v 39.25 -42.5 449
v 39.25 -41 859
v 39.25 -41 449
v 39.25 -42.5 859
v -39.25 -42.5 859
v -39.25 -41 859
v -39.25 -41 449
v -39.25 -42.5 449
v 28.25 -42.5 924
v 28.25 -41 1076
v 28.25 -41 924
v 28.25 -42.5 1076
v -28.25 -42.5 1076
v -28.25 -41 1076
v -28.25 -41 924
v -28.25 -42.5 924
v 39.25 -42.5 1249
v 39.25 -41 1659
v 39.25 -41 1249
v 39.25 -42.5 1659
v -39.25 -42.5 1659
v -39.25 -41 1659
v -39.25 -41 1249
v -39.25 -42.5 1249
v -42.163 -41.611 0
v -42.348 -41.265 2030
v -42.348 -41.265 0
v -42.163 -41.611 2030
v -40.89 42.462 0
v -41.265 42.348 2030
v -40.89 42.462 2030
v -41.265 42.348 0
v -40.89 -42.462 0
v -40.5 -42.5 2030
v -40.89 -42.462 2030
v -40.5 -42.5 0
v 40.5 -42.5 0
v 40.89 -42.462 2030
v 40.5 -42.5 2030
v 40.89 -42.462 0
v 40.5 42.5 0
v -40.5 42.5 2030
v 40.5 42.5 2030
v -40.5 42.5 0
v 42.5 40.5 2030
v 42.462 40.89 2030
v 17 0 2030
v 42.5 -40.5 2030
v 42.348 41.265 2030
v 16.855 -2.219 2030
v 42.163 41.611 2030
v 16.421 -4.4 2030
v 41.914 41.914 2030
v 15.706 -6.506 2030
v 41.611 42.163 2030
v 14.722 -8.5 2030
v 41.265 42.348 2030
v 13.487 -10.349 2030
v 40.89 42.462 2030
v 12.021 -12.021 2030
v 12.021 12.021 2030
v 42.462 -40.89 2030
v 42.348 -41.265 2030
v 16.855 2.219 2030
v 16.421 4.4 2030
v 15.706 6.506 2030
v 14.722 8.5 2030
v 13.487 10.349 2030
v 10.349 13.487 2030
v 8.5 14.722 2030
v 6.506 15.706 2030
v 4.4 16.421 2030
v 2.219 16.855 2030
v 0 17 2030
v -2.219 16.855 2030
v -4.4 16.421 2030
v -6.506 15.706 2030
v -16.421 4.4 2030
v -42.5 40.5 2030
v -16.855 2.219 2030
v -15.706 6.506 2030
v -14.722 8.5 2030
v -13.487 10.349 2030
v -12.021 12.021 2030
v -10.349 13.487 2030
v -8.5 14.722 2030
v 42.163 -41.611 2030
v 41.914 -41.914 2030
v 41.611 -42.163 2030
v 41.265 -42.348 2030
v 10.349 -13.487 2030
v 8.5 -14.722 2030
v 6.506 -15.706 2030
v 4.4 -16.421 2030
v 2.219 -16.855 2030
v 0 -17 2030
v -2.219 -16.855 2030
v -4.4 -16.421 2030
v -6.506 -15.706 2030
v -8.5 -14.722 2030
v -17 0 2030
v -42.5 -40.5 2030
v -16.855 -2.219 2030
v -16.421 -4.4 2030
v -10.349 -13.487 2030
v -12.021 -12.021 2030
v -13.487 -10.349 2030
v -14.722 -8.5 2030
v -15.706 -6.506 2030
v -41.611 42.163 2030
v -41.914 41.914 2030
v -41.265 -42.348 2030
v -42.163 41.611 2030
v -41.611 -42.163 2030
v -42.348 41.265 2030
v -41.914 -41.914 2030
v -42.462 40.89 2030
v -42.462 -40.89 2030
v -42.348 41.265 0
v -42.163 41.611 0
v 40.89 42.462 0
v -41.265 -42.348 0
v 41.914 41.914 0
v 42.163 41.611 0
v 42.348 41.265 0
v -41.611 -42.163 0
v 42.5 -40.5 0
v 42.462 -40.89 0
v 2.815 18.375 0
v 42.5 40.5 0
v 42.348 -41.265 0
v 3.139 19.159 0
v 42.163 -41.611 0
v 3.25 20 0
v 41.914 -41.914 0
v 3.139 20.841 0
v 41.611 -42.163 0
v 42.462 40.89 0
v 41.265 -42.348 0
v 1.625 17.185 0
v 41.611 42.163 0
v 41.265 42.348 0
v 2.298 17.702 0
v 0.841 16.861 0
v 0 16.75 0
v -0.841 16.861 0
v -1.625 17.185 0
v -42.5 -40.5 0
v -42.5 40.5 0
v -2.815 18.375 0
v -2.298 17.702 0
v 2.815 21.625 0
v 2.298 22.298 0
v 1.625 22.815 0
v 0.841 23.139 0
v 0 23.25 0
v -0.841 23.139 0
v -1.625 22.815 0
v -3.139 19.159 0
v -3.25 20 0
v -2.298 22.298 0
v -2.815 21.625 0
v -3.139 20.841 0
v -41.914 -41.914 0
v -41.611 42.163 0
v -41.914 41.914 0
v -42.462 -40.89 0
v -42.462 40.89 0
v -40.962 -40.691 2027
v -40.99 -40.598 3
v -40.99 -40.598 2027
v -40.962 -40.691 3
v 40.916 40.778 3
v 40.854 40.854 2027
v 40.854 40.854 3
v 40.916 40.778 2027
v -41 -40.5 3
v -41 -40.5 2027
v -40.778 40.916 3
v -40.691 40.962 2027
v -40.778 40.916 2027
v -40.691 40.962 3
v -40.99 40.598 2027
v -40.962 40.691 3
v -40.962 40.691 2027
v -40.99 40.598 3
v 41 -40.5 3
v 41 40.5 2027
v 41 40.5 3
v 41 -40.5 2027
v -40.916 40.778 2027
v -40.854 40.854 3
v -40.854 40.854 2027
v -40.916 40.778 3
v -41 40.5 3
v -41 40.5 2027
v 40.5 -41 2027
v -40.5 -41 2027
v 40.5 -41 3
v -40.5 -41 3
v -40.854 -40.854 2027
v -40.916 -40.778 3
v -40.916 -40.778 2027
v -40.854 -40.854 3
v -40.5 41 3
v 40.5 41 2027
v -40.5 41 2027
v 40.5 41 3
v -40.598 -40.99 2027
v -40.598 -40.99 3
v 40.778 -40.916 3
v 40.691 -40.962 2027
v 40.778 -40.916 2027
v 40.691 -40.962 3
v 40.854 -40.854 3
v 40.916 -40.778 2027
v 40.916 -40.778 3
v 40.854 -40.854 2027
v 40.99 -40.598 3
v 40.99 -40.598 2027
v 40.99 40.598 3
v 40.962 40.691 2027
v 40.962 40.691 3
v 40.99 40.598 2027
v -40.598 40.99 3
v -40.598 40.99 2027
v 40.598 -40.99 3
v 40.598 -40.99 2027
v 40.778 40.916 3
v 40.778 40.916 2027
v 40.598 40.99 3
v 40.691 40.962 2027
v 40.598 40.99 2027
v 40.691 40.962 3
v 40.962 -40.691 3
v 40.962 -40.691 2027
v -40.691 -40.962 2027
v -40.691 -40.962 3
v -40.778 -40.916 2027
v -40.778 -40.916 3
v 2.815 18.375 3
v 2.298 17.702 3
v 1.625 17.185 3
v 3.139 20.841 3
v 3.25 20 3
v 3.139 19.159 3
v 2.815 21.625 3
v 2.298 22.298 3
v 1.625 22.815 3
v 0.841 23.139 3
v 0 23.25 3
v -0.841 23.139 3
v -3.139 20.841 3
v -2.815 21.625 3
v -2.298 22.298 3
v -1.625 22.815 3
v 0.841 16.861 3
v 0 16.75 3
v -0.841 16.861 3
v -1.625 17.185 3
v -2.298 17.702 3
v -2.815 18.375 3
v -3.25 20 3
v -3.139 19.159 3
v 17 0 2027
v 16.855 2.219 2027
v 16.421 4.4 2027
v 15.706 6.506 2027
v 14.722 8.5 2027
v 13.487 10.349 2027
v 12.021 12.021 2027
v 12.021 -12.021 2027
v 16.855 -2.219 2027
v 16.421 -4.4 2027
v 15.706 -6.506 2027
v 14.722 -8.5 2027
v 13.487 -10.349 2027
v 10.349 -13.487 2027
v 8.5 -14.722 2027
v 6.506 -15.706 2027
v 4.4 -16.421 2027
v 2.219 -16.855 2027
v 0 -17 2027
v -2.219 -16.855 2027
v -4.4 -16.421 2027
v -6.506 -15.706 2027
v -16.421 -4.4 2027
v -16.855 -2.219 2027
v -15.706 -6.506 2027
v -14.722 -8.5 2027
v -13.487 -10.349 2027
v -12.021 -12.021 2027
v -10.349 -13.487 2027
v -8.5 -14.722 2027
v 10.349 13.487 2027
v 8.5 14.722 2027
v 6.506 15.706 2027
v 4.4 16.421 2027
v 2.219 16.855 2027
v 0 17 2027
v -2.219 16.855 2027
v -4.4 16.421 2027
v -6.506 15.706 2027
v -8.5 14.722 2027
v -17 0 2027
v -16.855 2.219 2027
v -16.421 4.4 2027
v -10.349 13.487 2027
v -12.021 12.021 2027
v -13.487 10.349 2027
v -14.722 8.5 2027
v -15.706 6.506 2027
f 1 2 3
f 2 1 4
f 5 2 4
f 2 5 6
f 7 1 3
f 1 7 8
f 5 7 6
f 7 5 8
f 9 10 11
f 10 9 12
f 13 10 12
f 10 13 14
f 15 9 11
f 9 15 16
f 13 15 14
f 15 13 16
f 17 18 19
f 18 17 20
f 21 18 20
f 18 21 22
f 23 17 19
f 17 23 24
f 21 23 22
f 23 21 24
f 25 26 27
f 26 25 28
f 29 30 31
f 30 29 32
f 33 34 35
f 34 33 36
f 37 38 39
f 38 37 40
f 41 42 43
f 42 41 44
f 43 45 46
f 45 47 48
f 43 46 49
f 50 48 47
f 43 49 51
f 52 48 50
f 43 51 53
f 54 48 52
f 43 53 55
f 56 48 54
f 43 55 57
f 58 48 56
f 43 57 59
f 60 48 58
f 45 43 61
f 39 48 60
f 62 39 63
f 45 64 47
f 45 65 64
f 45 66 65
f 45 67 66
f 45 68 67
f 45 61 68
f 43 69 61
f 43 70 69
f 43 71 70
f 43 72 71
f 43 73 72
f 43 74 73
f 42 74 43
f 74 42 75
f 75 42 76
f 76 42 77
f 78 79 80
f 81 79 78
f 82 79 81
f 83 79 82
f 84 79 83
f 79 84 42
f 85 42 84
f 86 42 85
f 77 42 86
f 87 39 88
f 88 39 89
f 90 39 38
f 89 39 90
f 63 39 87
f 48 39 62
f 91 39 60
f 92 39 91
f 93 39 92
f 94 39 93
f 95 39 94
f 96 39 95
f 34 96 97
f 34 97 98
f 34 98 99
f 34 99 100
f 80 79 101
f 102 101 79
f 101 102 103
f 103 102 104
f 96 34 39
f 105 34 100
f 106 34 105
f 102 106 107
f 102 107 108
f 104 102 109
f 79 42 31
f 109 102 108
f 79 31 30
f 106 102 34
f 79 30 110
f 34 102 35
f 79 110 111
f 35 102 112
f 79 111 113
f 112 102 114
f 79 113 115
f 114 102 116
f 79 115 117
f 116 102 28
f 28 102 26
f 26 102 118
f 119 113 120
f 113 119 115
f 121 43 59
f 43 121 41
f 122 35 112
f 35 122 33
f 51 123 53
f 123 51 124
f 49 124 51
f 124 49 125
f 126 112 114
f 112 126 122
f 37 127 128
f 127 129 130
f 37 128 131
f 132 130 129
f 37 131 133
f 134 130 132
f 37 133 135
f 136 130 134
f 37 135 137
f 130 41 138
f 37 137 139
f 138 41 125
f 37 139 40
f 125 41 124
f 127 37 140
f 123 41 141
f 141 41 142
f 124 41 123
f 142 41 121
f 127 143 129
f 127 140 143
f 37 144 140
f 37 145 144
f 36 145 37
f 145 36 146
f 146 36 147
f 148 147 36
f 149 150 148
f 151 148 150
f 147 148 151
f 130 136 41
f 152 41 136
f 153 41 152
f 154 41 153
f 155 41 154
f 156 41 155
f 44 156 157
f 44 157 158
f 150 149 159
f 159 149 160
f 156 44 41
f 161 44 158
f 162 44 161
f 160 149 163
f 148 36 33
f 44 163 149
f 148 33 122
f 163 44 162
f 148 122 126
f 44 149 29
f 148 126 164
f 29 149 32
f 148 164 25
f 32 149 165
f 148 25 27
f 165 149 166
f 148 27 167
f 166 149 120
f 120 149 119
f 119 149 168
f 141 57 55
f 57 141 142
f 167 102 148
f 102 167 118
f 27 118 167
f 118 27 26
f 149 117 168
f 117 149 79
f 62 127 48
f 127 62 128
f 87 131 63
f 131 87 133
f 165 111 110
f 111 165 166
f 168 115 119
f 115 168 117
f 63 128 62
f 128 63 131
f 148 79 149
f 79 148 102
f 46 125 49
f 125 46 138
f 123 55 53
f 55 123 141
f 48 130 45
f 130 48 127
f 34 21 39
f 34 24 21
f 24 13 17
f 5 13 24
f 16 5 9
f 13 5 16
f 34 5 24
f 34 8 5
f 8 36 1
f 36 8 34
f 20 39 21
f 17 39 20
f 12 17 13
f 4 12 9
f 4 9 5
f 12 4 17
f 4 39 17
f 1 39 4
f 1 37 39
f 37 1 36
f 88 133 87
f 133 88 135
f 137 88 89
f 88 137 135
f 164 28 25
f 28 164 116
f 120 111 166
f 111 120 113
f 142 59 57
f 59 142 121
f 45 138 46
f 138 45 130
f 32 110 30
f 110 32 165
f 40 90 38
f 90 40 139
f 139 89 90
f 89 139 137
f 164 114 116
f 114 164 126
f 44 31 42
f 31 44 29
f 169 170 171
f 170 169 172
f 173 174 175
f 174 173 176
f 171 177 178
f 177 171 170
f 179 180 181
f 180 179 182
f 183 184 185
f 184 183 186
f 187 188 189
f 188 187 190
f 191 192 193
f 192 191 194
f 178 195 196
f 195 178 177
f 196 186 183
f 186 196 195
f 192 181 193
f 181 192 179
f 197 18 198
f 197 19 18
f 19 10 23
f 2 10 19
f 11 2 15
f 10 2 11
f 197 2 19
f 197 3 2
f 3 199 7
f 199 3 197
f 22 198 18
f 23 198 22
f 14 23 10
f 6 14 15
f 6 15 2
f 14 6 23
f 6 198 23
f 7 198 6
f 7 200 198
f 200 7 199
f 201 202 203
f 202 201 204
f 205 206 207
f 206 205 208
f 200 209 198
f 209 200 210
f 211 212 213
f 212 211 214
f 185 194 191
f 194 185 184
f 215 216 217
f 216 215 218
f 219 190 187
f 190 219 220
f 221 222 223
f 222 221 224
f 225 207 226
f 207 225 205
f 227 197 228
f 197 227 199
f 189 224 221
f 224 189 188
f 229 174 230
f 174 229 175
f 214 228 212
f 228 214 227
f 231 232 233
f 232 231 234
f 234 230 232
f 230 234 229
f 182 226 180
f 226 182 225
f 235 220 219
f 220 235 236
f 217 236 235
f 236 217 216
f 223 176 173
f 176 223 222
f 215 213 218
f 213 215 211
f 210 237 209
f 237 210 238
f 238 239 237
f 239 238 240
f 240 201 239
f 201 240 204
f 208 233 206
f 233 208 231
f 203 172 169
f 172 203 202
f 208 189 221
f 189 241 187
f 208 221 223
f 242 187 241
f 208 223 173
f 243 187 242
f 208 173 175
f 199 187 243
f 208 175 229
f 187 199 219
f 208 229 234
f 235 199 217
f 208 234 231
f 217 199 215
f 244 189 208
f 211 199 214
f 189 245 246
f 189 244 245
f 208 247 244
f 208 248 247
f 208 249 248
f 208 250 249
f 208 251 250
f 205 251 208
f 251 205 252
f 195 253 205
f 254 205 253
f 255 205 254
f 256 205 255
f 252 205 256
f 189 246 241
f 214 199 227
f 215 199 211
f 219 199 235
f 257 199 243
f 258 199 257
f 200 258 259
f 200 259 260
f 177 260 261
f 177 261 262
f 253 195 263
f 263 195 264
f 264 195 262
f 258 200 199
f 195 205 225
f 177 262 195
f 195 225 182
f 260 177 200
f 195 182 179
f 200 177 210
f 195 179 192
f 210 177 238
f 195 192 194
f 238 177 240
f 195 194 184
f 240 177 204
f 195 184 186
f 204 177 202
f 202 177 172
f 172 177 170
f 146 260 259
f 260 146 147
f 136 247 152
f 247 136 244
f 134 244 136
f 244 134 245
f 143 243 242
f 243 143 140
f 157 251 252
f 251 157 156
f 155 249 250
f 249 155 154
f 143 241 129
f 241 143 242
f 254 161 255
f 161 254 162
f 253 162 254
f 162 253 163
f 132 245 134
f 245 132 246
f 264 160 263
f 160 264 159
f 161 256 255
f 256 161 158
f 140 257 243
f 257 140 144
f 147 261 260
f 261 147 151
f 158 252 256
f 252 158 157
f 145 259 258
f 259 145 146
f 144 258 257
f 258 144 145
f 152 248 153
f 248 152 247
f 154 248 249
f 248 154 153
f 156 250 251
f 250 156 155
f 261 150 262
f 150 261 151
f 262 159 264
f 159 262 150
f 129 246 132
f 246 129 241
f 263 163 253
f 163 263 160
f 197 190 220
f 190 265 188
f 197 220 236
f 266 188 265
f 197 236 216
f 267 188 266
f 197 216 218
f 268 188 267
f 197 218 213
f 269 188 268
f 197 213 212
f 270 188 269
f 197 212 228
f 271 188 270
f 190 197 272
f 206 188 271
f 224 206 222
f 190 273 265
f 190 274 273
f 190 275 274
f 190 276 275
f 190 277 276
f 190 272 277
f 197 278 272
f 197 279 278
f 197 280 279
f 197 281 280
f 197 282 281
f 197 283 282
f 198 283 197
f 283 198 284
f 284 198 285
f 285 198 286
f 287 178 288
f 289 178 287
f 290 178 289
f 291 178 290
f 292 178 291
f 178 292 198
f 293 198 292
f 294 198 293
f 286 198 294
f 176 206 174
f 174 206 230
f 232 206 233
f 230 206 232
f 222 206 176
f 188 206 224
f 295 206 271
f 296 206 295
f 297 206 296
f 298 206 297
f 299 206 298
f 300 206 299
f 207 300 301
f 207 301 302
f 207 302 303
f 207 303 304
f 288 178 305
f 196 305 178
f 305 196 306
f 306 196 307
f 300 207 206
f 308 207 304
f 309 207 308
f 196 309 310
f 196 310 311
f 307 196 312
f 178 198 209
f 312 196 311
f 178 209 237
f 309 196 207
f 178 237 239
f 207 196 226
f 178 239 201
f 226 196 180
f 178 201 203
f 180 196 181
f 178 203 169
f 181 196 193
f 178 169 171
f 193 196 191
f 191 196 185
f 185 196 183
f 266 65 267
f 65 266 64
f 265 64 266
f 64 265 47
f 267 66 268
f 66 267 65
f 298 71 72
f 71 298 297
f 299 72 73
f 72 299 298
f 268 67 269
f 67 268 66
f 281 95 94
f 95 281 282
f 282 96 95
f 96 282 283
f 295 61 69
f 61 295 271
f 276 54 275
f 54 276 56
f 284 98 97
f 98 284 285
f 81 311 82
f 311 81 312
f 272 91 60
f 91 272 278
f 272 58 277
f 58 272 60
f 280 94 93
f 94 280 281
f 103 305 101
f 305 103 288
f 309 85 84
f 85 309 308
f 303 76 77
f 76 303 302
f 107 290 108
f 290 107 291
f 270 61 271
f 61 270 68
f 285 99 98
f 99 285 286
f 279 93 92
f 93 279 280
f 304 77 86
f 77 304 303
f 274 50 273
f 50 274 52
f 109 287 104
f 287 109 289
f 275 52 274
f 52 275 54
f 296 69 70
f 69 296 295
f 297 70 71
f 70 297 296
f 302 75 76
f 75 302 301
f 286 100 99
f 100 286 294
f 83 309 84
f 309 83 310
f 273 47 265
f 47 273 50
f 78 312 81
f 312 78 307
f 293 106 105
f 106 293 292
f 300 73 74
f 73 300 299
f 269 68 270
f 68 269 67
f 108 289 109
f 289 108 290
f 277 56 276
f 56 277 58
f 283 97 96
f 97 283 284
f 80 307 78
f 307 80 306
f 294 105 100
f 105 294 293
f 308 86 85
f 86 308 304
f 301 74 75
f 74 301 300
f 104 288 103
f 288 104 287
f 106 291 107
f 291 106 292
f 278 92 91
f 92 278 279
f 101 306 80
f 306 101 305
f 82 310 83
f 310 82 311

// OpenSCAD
// =====================================================================
// sub_chassis.scad
// APC NetShelter Rack PDU Advanced 100A (APDU11590SM)
// Casing ekstrusi 2030 x 85 x 85 mm, plat 1.5 mm, fillet sudut R2
// Sumbu: X = lebar, Y = kedalaman (front face = -Y), Z = tinggi (0 = dasar)
// =====================================================================

$fn = 32;

CHASSIS_H = 2030.0;
CHASSIS_W = 85.0;
CHASSIS_D = 85.0;
CHASSIS_WALL = 1.5;
CHASSIS_R = 2.0;
CAP_T = 3.0;               // tebal end cap atas/bawah
GLAND_HOLE_DIA = 34.0;     // lubang cable gland di top cap
GROUND_HOLE_DIA = 6.5;     // lubang grounding stud M6 di bottom cap

// Zona cutout muka: [z_center, tinggi, lebar]
// Disesuaikan presisi dengan posisi modul pada assembly:
// - Bank Bawah: Z = 450 s/d 858 mm (tinggi 408 mm, lebar 78 mm)
// - NMC3 Cassette: Z = 1000 mm (tinggi 152 mm, lebar 56 mm)
// - Bank Atas: Z = 1250 s/d 1658 mm (tinggi 408 mm, lebar 78 mm)
CHASSIS_FRONT_ZONES = [
    [ 654.0, 410.0, 78.5],    // Bank Bawah (Soket 1-24 + Breakers B1-B6)
    [1000.0, 152.0, 56.5],    // NMC3 Controller Cassette
    [1454.0, 410.0, 78.5],    // Bank Atas (Soket 25-48 + Breakers B7-B12)
];

module rounded_square_2d(w, d, r) {
    hull()
        for (x = [-w/2 + r, w/2 - r])
            for (y = [-d/2 + r, d/2 - r])
                translate([x, y])
                    circle(r = r, $fn = 32);
}

module sub_chassis(h = CHASSIS_H, w = CHASSIS_W, d = CHASSIS_D,
                   wall = CHASSIS_WALL, r = CHASSIS_R,
                   front_zones = CHASSIS_FRONT_ZONES) {
    col_shell = [0.125, 0.125, 0.135];   // powder-coat matte black RAL 9005
    col_cap   = [0.09, 0.09, 0.10];

    // ---- Badan ekstrusi (tabung persegi berongga) ----
    color(col_shell)
        difference() {
            linear_extrude(height = h)
                rounded_square_2d(w, d, r);
            translate([0, 0, -0.5])
                linear_extrude(height = h + 1)
                    rounded_square_2d(w - 2*wall, d - 2*wall,
                                      max(r - wall, 0.1));
            // Cutout zona muka (front = -Y)
            for (zone = front_zones)
                translate([-zone[2]/2, -d/2 - 0.5, zone[0] - zone[1]/2])
                    cube([zone[2], wall + 1, zone[1]]);
        }

    // ---- Bottom cap (Z = 0), rata, lubang grounding M6 ----
    color(col_cap)
        difference() {
            linear_extrude(height = CAP_T)
                rounded_square_2d(w - 0.6, d - 0.6, max(r - 0.3, 0.1));
            translate([0, 20, -0.5])
                cylinder(d = GROUND_HOLE_DIA, h = CAP_T + 1, $fn = 24);
        }

    // ---- Top cap (Z = h), lubang cable gland Ø34 ----
    color(col_cap)
        translate([0, 0, h - CAP_T])
            difference() {
                linear_extrude(height = CAP_T)
                    rounded_square_2d(w - 0.6, d - 0.6, max(r - 0.3, 0.1));
                translate([0, 0, -0.5])
                    cylinder(d = GLAND_HOLE_DIA, h = CAP_T + 1, $fn = 48);
            }
}

// Preview standalone
sub_chassis();
